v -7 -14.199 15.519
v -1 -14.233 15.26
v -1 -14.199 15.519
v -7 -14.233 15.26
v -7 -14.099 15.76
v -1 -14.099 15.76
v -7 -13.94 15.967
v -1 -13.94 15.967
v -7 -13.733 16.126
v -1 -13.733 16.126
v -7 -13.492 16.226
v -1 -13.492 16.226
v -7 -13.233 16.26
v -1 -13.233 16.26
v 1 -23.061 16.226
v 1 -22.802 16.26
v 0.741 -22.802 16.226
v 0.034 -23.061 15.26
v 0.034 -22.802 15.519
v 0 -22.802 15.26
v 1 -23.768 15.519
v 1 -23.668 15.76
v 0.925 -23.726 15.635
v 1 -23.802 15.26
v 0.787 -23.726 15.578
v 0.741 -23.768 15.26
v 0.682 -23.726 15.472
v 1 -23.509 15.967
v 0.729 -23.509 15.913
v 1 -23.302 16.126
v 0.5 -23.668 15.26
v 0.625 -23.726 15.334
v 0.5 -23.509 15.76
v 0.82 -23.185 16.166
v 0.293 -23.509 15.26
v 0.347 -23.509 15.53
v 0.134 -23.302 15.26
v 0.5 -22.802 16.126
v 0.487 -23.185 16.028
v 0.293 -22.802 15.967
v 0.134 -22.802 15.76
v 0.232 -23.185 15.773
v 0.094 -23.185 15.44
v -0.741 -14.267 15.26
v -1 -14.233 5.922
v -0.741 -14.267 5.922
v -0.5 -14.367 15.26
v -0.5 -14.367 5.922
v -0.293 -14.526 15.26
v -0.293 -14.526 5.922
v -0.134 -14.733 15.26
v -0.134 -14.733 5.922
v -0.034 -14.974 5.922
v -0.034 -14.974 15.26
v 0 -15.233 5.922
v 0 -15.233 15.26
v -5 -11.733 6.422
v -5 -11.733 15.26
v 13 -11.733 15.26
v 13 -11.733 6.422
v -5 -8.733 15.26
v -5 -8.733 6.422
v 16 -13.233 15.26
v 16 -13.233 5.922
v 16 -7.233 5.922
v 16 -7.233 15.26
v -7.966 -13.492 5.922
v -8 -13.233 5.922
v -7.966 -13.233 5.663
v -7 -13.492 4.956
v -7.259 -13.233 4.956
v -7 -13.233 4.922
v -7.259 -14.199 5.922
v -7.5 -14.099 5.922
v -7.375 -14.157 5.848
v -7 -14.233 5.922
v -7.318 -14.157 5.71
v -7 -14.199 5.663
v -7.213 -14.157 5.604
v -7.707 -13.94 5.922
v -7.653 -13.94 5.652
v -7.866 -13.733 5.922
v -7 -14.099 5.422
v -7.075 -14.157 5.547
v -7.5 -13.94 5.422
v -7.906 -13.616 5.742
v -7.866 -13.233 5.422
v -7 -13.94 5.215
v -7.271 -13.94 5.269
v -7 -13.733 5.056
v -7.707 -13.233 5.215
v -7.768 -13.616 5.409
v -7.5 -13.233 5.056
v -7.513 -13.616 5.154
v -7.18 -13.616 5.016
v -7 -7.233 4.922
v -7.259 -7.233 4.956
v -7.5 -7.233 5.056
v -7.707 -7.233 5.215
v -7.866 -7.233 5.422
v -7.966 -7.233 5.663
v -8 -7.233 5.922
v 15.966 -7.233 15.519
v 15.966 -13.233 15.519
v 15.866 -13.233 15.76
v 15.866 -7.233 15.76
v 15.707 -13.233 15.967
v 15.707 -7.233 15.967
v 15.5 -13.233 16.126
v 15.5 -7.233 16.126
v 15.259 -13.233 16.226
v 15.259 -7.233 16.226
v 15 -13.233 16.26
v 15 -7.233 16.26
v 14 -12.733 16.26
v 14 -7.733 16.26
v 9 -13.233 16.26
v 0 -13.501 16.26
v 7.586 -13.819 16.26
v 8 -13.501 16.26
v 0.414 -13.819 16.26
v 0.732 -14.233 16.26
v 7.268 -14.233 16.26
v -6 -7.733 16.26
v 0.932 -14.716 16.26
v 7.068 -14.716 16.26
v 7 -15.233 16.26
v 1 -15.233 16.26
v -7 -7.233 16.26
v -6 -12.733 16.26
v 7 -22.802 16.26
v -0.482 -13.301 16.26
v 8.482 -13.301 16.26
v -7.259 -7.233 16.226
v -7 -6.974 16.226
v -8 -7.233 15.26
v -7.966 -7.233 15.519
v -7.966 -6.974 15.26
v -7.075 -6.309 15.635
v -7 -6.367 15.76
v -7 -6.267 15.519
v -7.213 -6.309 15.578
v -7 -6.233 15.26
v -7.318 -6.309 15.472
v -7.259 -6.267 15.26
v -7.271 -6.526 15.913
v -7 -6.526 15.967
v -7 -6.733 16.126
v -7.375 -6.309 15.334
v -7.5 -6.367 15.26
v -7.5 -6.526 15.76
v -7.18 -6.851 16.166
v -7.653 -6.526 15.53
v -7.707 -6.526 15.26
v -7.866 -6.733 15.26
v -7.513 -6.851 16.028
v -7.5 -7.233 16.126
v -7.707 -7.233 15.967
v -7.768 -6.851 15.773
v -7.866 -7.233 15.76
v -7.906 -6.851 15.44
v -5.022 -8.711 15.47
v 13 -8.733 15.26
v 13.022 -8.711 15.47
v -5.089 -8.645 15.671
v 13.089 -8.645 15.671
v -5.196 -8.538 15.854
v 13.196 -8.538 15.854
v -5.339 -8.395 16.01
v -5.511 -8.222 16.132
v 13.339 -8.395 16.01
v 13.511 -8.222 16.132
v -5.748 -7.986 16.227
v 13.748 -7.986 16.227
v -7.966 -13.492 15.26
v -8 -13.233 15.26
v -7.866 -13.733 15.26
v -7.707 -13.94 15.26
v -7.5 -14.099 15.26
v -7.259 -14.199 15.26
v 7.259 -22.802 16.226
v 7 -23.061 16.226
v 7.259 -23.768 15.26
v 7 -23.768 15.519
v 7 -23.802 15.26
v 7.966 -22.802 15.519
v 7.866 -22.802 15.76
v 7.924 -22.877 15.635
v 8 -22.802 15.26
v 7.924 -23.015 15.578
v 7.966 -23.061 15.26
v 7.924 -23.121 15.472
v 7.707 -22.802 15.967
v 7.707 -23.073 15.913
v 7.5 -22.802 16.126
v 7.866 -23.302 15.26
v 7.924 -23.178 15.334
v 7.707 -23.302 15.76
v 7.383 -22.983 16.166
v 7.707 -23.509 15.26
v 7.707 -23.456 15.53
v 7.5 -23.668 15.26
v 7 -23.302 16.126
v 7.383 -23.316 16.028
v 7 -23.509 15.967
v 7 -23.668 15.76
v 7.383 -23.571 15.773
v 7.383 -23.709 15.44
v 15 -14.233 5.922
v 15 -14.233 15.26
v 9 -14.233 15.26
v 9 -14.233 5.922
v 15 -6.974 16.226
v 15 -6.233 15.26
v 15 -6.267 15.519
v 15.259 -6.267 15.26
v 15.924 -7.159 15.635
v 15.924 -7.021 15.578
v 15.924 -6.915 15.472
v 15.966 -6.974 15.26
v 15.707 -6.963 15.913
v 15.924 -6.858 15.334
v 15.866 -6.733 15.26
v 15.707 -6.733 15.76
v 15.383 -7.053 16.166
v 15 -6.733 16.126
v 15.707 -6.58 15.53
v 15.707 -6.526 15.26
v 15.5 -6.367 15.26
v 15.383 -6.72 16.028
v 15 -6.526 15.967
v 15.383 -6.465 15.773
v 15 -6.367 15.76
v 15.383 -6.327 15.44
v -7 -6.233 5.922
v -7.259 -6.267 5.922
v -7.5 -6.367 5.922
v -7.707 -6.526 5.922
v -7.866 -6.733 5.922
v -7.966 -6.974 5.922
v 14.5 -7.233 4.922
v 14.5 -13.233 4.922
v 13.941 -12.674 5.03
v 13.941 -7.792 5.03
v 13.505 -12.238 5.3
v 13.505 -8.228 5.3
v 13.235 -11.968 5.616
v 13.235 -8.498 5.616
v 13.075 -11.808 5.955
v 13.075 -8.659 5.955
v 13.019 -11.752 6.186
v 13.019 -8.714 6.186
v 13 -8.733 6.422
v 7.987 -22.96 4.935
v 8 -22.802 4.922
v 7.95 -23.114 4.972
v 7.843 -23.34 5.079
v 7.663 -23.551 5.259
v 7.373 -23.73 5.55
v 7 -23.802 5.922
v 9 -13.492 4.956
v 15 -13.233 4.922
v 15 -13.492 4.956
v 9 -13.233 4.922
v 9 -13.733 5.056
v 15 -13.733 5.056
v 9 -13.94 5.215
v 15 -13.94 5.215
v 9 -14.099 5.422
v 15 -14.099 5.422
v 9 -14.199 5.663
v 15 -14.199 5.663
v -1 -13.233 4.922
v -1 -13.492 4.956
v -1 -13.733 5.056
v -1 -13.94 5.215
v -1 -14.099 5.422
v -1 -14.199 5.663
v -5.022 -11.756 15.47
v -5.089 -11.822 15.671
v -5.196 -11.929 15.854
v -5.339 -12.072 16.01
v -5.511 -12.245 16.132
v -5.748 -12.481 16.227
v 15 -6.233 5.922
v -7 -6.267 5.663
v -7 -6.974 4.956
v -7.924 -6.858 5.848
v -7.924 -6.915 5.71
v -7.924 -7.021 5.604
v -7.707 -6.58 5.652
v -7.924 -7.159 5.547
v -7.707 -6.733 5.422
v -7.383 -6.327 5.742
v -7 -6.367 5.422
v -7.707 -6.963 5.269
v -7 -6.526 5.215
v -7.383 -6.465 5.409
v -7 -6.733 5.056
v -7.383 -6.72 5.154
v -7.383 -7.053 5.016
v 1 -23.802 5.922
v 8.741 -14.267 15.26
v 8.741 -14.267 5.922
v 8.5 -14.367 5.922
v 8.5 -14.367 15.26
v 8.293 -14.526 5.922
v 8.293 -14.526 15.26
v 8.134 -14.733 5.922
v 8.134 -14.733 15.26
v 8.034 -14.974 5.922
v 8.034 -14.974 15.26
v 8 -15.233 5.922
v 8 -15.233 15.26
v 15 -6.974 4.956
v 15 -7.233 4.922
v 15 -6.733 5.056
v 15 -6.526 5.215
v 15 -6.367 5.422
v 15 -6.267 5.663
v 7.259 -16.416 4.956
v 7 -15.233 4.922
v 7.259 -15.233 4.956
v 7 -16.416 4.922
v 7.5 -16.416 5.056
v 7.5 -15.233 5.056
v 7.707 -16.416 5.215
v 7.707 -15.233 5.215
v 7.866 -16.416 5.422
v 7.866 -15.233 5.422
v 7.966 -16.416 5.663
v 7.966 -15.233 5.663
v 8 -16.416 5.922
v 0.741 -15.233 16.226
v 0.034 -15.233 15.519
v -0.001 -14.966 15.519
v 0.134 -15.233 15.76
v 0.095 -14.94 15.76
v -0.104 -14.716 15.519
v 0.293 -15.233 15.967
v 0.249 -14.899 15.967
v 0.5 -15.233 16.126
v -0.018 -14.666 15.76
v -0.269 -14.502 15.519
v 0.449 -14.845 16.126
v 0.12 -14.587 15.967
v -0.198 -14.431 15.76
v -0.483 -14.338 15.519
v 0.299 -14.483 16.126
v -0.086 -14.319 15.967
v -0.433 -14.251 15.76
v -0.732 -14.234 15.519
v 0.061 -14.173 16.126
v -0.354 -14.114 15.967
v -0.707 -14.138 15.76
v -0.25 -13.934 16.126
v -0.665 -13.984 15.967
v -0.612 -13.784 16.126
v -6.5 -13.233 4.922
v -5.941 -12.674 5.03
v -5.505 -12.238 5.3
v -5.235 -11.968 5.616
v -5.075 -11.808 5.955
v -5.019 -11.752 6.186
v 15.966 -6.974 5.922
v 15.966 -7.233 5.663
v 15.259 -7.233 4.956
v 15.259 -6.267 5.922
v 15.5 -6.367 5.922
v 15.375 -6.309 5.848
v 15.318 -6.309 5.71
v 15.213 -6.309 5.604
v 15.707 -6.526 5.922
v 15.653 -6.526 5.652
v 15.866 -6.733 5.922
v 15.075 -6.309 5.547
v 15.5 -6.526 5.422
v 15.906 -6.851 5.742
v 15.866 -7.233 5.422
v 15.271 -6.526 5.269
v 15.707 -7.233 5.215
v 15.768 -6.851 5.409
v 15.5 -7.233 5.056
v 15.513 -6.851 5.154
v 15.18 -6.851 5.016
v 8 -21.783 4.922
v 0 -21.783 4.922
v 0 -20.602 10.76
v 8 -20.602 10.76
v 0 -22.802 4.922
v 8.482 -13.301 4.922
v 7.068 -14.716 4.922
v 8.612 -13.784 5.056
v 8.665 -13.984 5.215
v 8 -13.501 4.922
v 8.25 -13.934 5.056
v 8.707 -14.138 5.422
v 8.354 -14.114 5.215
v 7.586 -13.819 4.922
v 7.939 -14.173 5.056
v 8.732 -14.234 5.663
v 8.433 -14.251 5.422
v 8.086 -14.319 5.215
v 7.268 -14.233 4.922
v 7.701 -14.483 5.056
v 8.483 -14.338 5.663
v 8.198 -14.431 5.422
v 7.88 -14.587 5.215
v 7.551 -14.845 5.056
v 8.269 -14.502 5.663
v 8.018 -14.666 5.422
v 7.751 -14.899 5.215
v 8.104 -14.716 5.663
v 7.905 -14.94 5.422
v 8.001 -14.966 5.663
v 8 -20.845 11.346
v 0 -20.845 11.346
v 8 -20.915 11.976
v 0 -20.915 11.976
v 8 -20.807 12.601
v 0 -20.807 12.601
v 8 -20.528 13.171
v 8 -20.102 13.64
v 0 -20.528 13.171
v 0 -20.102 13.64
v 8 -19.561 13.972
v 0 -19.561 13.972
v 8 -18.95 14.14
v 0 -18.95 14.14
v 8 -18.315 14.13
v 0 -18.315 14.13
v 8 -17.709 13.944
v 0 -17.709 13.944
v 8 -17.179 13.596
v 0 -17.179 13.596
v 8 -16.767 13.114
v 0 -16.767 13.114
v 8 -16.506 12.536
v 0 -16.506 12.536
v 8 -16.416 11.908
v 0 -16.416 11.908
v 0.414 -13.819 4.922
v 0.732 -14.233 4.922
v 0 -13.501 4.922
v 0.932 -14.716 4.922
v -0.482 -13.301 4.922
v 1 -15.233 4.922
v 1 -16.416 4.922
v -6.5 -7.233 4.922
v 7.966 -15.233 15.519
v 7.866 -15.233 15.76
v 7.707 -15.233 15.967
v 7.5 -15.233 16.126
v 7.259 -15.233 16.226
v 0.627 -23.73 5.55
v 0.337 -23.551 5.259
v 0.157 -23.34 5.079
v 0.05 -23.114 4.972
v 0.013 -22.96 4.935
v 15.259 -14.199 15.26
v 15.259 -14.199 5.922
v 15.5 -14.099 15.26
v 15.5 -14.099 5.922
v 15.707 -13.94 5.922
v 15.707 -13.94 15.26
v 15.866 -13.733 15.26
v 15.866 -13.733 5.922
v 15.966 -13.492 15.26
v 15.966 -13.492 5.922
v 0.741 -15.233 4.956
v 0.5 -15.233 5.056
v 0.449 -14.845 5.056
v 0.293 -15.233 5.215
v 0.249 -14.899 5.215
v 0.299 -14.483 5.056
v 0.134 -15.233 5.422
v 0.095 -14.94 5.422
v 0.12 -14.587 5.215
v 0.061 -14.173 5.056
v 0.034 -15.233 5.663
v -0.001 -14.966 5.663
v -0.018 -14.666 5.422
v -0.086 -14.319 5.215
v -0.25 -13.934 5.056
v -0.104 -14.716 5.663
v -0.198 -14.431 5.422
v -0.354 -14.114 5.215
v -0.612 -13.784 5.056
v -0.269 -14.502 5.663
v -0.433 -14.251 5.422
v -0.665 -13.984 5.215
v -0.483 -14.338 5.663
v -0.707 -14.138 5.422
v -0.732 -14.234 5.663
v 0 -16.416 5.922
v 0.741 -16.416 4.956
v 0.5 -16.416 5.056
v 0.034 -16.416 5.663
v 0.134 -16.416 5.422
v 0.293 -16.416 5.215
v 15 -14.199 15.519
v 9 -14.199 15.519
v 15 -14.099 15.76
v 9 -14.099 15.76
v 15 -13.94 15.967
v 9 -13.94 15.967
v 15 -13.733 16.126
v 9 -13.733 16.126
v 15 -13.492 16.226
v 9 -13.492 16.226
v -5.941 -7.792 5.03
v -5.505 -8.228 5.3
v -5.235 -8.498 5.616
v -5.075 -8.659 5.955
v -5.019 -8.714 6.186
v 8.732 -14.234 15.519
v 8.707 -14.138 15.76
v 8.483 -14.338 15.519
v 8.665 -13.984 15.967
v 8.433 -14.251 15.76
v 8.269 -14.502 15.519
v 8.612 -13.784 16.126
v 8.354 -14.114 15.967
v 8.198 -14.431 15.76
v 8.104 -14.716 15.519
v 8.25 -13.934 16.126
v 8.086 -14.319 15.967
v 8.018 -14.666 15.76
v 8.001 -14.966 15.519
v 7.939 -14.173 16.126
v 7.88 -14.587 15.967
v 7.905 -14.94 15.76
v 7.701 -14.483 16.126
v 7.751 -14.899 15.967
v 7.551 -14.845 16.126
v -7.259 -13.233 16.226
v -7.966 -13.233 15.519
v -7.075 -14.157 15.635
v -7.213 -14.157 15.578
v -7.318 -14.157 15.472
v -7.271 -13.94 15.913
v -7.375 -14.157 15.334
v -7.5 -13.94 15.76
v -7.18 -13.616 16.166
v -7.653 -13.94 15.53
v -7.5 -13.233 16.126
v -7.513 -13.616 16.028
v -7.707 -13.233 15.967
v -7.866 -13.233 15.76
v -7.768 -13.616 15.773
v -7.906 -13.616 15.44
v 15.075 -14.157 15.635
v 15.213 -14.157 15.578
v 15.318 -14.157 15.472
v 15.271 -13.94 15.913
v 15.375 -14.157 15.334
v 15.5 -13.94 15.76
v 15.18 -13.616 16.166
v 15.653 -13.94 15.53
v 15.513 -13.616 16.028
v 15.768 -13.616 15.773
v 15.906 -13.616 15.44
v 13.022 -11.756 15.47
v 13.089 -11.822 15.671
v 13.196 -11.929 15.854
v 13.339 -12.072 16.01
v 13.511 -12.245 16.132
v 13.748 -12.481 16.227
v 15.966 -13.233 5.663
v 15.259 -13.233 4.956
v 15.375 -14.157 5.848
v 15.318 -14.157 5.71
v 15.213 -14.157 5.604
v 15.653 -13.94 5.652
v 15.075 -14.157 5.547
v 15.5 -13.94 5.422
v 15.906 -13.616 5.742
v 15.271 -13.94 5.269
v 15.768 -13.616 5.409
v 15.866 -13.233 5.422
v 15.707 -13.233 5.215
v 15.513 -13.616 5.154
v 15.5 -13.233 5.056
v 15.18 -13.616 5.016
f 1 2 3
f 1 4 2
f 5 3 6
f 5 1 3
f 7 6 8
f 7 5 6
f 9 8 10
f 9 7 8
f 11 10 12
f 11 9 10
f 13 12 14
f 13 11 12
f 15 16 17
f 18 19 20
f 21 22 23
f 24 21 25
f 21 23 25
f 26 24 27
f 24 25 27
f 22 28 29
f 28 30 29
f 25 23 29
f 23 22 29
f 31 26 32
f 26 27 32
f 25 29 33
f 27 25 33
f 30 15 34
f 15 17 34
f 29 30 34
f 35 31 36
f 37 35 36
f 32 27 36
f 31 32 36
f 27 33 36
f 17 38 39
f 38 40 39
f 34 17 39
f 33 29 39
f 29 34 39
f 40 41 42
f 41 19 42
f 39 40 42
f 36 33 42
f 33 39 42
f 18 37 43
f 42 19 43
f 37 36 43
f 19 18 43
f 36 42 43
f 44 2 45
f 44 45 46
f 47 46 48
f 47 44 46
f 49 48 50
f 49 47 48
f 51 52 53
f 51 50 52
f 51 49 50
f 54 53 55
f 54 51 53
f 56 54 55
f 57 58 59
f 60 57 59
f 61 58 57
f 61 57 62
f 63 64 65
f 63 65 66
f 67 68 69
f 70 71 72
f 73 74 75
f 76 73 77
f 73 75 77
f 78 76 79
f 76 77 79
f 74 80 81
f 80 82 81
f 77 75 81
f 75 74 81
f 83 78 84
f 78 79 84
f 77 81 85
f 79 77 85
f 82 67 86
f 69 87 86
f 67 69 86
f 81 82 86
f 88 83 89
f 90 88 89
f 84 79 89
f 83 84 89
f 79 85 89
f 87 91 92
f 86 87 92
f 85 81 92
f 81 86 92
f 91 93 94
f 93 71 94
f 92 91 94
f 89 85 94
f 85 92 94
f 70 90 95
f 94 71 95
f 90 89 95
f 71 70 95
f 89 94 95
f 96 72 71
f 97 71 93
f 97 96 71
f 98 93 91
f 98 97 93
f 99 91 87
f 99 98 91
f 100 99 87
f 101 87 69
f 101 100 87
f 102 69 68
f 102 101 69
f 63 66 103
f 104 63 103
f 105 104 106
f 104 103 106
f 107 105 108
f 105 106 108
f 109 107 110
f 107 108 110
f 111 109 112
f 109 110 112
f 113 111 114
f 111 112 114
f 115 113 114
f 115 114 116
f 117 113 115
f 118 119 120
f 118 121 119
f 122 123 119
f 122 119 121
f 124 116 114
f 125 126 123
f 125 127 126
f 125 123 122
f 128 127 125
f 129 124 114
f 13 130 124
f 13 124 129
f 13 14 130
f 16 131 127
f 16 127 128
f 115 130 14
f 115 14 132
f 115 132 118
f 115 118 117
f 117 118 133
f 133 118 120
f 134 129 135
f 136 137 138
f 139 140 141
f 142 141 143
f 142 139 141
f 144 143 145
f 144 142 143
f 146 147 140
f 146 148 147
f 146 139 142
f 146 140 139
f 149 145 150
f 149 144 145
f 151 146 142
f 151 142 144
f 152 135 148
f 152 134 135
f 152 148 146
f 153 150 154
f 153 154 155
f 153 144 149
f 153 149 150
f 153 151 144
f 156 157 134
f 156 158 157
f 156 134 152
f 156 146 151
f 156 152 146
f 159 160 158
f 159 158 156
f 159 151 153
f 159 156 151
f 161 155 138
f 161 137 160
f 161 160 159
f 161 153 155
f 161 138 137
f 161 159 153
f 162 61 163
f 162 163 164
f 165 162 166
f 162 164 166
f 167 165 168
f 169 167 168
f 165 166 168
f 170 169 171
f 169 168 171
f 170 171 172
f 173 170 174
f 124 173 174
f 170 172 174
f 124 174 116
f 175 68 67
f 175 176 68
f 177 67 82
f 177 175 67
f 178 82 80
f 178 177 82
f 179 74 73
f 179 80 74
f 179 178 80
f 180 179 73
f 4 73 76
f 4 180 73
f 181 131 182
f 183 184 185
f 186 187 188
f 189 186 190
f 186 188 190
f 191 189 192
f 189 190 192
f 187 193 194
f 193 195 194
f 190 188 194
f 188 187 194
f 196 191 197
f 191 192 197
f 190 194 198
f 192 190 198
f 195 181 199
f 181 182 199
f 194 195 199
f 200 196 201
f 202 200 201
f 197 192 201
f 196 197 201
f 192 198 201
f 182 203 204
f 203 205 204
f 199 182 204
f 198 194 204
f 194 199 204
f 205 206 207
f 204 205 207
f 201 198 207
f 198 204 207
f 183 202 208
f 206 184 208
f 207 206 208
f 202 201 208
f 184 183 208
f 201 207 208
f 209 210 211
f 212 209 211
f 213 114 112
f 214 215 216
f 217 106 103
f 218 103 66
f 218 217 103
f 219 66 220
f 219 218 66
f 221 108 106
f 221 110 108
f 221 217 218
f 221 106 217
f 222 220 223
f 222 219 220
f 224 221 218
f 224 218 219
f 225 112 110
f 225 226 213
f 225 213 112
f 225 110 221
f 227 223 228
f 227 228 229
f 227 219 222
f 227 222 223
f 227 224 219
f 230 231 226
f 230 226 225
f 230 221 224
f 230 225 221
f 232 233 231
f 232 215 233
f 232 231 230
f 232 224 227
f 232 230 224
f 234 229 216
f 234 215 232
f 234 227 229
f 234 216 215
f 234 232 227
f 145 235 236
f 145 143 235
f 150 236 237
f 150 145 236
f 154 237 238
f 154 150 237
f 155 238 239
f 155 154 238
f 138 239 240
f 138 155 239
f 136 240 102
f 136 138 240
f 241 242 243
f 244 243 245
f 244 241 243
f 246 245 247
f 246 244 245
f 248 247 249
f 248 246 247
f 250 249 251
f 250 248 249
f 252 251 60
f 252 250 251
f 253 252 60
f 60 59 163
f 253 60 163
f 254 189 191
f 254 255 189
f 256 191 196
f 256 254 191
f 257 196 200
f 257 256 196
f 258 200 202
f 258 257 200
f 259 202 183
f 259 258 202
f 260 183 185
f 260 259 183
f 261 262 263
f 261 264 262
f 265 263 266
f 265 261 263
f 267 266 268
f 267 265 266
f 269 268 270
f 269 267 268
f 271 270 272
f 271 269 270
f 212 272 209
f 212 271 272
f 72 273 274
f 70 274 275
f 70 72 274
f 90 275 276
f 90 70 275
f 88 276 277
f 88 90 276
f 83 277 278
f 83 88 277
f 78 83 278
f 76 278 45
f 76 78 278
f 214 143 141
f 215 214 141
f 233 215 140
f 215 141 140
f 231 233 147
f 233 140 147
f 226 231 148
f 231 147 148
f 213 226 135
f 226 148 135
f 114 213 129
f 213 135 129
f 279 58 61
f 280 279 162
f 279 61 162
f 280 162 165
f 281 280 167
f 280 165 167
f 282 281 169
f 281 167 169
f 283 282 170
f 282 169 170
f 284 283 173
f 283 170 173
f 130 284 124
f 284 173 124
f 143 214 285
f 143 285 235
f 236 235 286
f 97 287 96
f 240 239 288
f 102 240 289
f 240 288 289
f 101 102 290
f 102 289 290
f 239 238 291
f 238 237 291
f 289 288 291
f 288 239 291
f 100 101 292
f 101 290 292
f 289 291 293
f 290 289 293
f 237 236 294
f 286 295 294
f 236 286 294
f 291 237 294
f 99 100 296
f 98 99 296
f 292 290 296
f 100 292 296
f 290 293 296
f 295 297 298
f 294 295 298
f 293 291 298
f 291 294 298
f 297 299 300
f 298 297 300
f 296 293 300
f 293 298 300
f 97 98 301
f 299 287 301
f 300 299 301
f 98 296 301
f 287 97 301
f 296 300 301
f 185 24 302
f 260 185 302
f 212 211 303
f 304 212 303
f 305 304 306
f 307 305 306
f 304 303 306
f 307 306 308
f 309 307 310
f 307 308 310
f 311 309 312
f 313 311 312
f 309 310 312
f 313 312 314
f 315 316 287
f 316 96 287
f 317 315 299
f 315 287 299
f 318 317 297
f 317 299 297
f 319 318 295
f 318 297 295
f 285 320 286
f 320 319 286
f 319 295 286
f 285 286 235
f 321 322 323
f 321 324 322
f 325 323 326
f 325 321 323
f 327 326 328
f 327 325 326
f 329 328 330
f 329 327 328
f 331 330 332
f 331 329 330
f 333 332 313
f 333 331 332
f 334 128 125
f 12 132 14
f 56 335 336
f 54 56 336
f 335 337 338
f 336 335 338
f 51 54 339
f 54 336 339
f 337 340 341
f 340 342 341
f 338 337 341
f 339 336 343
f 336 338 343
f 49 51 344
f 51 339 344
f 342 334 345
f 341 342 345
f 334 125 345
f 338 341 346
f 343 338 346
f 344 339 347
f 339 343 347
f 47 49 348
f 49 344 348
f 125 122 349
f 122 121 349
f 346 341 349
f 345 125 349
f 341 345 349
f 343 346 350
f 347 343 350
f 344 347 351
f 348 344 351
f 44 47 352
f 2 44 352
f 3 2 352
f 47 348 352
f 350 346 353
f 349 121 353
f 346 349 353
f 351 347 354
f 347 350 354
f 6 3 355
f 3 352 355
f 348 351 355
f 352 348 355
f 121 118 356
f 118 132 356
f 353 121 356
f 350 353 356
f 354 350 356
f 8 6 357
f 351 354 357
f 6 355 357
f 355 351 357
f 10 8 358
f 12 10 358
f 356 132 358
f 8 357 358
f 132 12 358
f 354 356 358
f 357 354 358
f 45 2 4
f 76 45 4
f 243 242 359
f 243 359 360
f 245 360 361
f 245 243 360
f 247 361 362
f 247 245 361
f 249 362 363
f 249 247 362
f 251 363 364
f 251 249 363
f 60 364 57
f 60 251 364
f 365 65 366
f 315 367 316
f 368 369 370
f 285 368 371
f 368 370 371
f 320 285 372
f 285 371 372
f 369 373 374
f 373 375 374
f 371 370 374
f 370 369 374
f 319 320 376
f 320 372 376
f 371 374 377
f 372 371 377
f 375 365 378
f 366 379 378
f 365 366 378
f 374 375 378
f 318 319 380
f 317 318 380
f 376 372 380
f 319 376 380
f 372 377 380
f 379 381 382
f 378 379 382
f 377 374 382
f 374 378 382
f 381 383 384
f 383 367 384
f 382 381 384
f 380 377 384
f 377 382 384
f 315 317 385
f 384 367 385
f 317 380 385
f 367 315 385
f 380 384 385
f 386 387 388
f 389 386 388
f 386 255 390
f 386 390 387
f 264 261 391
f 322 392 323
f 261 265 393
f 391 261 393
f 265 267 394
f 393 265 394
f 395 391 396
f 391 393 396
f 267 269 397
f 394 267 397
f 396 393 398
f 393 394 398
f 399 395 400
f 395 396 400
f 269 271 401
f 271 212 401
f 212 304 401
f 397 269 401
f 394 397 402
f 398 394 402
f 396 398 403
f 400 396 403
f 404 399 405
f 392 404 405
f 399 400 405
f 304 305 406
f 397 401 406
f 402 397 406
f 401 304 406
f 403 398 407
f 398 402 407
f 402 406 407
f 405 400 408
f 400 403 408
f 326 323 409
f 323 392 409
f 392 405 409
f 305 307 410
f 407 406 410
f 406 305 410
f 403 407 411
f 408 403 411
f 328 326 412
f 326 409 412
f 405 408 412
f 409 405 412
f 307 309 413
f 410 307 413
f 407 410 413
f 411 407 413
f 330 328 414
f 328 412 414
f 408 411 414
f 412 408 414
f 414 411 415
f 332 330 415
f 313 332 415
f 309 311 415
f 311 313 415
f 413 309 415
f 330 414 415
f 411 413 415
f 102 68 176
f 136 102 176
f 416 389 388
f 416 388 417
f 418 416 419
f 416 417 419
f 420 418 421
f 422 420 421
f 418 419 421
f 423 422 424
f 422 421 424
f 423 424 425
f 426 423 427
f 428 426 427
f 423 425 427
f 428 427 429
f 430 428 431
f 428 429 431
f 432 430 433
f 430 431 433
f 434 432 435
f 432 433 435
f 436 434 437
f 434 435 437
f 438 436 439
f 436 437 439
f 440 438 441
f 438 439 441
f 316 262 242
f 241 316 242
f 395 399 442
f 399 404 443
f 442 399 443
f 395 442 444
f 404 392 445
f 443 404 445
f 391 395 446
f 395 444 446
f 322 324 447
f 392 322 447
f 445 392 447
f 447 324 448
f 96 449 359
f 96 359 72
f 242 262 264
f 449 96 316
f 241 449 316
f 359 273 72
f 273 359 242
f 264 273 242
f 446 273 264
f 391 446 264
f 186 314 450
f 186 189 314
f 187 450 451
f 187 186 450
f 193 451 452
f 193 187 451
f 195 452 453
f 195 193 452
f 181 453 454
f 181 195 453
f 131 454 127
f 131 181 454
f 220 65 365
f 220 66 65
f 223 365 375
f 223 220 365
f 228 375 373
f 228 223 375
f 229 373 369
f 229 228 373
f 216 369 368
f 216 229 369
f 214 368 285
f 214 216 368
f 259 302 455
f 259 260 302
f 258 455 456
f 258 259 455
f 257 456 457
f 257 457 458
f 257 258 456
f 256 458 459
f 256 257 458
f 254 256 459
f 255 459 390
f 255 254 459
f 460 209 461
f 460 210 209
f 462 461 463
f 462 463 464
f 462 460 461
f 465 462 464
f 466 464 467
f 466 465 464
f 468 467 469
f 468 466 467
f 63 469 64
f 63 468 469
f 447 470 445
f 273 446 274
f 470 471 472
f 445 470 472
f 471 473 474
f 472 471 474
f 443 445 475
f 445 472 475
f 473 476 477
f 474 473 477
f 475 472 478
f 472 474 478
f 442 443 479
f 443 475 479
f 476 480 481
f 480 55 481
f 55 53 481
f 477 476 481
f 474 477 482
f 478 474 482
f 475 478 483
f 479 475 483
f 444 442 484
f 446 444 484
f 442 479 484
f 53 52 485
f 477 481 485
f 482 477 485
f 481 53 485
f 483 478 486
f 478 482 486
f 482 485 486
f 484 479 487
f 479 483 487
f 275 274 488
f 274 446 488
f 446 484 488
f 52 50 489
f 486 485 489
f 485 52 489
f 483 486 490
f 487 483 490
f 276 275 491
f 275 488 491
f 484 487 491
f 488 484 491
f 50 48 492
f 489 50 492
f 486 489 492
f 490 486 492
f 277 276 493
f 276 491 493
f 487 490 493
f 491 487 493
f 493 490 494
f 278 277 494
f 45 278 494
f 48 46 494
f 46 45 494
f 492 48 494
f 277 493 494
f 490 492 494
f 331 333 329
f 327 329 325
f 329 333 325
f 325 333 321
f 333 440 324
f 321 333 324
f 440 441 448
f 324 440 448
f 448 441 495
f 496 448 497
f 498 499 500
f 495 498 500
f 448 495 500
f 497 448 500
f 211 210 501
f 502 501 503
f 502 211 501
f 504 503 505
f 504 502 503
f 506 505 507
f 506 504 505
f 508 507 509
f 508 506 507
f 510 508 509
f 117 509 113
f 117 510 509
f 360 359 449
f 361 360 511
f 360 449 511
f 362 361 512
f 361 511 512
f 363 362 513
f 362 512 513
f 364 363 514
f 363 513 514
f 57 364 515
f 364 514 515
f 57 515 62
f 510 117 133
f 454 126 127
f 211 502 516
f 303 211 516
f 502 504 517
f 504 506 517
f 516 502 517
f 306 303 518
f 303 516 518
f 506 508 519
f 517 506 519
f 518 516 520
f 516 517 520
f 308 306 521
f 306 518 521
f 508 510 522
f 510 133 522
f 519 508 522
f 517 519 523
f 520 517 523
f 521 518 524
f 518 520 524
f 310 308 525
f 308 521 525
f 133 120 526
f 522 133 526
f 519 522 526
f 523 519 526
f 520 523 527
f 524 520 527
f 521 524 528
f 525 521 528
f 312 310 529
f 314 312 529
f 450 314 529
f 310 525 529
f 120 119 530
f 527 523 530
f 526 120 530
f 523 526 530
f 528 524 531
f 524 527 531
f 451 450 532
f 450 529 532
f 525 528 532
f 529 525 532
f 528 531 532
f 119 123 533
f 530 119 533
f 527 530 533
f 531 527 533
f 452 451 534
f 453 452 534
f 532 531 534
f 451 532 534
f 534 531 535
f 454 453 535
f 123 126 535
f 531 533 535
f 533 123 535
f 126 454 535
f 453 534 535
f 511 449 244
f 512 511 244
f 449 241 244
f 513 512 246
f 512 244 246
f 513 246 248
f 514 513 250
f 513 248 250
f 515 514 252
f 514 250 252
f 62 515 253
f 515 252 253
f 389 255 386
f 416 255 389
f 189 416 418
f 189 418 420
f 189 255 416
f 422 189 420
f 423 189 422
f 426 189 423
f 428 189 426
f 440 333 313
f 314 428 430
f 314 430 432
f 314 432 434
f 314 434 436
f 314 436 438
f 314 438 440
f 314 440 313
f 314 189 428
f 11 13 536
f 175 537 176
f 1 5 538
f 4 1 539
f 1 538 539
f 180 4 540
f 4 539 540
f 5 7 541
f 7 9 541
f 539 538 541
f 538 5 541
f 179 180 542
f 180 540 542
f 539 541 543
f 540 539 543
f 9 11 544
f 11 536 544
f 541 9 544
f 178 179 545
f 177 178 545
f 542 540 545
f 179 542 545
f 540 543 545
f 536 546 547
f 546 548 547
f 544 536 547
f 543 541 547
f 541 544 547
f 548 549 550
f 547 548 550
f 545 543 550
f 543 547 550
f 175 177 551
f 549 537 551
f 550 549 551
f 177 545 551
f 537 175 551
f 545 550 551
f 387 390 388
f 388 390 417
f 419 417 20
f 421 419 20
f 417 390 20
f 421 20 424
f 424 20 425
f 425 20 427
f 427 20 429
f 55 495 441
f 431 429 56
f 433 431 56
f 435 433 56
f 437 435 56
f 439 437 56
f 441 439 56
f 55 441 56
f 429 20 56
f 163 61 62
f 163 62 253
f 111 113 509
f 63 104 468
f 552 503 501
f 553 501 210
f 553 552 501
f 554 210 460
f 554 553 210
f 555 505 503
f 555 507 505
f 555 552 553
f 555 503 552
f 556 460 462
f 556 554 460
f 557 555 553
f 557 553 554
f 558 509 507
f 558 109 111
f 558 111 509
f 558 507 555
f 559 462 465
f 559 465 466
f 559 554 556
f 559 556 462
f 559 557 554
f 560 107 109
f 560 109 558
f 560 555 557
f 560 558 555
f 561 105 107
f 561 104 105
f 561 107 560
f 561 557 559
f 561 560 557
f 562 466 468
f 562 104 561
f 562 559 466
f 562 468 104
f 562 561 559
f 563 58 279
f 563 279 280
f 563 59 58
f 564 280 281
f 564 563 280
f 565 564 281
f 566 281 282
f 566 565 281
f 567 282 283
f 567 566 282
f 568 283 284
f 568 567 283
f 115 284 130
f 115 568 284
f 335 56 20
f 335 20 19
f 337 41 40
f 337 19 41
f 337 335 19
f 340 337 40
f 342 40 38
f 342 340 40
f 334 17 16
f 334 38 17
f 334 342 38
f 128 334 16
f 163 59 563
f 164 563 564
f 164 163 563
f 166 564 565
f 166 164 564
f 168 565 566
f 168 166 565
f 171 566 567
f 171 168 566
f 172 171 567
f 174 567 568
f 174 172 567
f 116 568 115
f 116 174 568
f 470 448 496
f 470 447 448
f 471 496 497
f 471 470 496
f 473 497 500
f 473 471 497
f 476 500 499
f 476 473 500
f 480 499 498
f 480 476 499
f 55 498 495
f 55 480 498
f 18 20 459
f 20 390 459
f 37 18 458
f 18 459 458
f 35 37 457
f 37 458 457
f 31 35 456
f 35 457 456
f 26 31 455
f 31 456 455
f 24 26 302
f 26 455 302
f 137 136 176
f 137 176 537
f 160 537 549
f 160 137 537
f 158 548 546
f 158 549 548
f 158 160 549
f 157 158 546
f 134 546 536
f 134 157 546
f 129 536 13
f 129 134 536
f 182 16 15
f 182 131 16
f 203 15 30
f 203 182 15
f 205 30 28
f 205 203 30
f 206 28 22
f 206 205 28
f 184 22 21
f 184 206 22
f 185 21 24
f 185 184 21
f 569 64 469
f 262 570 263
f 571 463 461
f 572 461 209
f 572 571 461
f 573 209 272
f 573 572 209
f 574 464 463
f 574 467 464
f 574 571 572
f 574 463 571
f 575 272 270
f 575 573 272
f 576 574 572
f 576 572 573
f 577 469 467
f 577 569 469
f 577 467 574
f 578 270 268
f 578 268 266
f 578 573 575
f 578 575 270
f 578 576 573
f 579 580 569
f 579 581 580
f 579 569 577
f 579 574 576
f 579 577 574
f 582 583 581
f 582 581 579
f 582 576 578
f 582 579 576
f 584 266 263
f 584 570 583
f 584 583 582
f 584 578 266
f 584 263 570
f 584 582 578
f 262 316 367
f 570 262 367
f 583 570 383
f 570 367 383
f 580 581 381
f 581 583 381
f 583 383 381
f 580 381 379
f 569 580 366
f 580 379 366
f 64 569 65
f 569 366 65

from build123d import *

# Parameters (mm, degrees)
F1_DEPTH = 8
F2_W     = 24
F2_H     = 11.337432079
F3_DEPTH = 8
F4_W     = 18
F4_H     = 3
F5_DEPTH = 11.338432079
F6_F1_R  = 1
F6_F2_R  = 1
F7_R     = 1.49999


# Not quite as in the source:
# - a fillet or chamfer is up to 0.001 mm smaller than in the source, because OpenCascade refuses the exact size


with BuildPart() as f1:
    # F0 (on Right) → F1 (new body)
    with BuildSketch(Plane.YZ):
        with BuildLine():
            ThreePointArc((-20.601621214, 10.7601184938), (-19.2613938683, 14.0777191086), (-16.4163531623, 11.9078281993))
            Line((-16.4163531623, 11.9078281993), (-16.4163531623, 4.9222996458))
            Line((-16.4163531623, 4.9222996458), (-14.2332110554, 4.9222996458))
            Line((-14.2332110554, 4.9222996458), (-14.2332110554, 16.2597317249))
            Line((-14.2332110554, 16.2597317249), (-23.8023772836, 16.2597317249))
            Line((-23.8023772836, 16.2597317249), (-23.8023772836, 4.9222996458))
            Line((-23.8023772836, 4.9222996458), (-21.7834785581, 4.9222996458))
            Line((-21.7834785581, 4.9222996458), (-20.601621214, 10.7601184938))
        make_face()
    extrude(amount=F1_DEPTH)

    # F2 (on face) → F3 (join)
    with BuildSketch(Plane(origin=(0, -14.2332110554, 0), x_dir=(-1, 0, 0), z_dir=(0, 1, 0))):
        with Locations((-4, 10.5910156853)):
            Rectangle(F2_W, F2_H)
    extrude(amount=F3_DEPTH)

    # F4 (on face) → F5 (cut, through all)
    with BuildSketch(Plane.XY.offset(16.2597317249)):
        with Locations((4, -10.2332110554)):
            Rectangle(F4_W, F4_H)
    extrude(amount=-F5_DEPTH, mode=Mode.SUBTRACT)

    # F6: fillet of radius 1 on 26 edges, made by hand

    # F6_f1
    f6_f1_edges = [f1.edges().sort_by_distance(p)[0] for p in [
        (0, -14.2332110554, 10.5910156853),
        (8, -14.2332110554, 10.5910156853),
    ]]
    fillet(f6_f1_edges, radius=F6_F1_R)

    # F6_f2
    f6_f2_edges = [f1.edges().sort_by_distance(p)[0] for p in [
        (-8, -10.2332110554, 16.2597317249),
        (-4.5, -14.2332110554, 16.2597317249),
        (4, -6.2332110554, 16.2597317249),
        (0, -19.5177941695, 16.2597317249),
        (16, -10.2332110554, 16.2597317249),
        (4, -23.8023772836, 16.2597317249),
        (12.5, -14.2332110554, 16.2597317249),
        (8, -19.5177941695, 16.2597317249),
        (-5, -10.2332110554, 16.2597317249),
        (4, -8.7332110554, 16.2597317249),
        (13, -10.2332110554, 16.2597317249),
        (4, -11.7332110554, 16.2597317249),
        (16, -10.2332110554, 4.9222996458),
        (16, -14.2332110554, 10.5910156853),
        (16, -6.2332110554, 10.5910156853),
        (4, -6.2332110554, 4.9222996458),
        (-8, -6.2332110554, 10.5910156853),
        (-8, -10.2332110554, 4.9222996458),
        (-8, -14.2332110554, 10.5910156853),
        (-4.5, -14.2332110554, 4.9222996458),
        (12.5, -14.2332110554, 4.9222996458),
        (4, -23.8023772836, 4.9222996458),
        (0, -23.8023772836, 10.5910156853),
        (8, -23.8023772836, 10.5910156853),
        (8.2928932188, -14.5261042742, 4.9222996458),
        (-0.2928932188, -14.5261042742, 4.9222996458),
        (8.2928932188, -14.5261042742, 16.2597317249),
        (-0.2928932188, -14.5261042742, 16.2597317249),
    ]]
    fillet(f6_f2_edges, radius=F6_F2_R)

    # F7 (radius 1.5 in the source; OpenCascade refuses exactly that, so slightly less here)
    f7_edges = [f1.edges().sort_by_distance(p)[0] for p in [
        (-5, -10.233211, 4.9223),
        (4, -11.733211, 4.9223),
        (4, -8.733211, 4.9223),
        (13, -10.233211, 4.9223),
    ]]
    fillet(f7_edges, radius=F7_R)


solid = f1.part
